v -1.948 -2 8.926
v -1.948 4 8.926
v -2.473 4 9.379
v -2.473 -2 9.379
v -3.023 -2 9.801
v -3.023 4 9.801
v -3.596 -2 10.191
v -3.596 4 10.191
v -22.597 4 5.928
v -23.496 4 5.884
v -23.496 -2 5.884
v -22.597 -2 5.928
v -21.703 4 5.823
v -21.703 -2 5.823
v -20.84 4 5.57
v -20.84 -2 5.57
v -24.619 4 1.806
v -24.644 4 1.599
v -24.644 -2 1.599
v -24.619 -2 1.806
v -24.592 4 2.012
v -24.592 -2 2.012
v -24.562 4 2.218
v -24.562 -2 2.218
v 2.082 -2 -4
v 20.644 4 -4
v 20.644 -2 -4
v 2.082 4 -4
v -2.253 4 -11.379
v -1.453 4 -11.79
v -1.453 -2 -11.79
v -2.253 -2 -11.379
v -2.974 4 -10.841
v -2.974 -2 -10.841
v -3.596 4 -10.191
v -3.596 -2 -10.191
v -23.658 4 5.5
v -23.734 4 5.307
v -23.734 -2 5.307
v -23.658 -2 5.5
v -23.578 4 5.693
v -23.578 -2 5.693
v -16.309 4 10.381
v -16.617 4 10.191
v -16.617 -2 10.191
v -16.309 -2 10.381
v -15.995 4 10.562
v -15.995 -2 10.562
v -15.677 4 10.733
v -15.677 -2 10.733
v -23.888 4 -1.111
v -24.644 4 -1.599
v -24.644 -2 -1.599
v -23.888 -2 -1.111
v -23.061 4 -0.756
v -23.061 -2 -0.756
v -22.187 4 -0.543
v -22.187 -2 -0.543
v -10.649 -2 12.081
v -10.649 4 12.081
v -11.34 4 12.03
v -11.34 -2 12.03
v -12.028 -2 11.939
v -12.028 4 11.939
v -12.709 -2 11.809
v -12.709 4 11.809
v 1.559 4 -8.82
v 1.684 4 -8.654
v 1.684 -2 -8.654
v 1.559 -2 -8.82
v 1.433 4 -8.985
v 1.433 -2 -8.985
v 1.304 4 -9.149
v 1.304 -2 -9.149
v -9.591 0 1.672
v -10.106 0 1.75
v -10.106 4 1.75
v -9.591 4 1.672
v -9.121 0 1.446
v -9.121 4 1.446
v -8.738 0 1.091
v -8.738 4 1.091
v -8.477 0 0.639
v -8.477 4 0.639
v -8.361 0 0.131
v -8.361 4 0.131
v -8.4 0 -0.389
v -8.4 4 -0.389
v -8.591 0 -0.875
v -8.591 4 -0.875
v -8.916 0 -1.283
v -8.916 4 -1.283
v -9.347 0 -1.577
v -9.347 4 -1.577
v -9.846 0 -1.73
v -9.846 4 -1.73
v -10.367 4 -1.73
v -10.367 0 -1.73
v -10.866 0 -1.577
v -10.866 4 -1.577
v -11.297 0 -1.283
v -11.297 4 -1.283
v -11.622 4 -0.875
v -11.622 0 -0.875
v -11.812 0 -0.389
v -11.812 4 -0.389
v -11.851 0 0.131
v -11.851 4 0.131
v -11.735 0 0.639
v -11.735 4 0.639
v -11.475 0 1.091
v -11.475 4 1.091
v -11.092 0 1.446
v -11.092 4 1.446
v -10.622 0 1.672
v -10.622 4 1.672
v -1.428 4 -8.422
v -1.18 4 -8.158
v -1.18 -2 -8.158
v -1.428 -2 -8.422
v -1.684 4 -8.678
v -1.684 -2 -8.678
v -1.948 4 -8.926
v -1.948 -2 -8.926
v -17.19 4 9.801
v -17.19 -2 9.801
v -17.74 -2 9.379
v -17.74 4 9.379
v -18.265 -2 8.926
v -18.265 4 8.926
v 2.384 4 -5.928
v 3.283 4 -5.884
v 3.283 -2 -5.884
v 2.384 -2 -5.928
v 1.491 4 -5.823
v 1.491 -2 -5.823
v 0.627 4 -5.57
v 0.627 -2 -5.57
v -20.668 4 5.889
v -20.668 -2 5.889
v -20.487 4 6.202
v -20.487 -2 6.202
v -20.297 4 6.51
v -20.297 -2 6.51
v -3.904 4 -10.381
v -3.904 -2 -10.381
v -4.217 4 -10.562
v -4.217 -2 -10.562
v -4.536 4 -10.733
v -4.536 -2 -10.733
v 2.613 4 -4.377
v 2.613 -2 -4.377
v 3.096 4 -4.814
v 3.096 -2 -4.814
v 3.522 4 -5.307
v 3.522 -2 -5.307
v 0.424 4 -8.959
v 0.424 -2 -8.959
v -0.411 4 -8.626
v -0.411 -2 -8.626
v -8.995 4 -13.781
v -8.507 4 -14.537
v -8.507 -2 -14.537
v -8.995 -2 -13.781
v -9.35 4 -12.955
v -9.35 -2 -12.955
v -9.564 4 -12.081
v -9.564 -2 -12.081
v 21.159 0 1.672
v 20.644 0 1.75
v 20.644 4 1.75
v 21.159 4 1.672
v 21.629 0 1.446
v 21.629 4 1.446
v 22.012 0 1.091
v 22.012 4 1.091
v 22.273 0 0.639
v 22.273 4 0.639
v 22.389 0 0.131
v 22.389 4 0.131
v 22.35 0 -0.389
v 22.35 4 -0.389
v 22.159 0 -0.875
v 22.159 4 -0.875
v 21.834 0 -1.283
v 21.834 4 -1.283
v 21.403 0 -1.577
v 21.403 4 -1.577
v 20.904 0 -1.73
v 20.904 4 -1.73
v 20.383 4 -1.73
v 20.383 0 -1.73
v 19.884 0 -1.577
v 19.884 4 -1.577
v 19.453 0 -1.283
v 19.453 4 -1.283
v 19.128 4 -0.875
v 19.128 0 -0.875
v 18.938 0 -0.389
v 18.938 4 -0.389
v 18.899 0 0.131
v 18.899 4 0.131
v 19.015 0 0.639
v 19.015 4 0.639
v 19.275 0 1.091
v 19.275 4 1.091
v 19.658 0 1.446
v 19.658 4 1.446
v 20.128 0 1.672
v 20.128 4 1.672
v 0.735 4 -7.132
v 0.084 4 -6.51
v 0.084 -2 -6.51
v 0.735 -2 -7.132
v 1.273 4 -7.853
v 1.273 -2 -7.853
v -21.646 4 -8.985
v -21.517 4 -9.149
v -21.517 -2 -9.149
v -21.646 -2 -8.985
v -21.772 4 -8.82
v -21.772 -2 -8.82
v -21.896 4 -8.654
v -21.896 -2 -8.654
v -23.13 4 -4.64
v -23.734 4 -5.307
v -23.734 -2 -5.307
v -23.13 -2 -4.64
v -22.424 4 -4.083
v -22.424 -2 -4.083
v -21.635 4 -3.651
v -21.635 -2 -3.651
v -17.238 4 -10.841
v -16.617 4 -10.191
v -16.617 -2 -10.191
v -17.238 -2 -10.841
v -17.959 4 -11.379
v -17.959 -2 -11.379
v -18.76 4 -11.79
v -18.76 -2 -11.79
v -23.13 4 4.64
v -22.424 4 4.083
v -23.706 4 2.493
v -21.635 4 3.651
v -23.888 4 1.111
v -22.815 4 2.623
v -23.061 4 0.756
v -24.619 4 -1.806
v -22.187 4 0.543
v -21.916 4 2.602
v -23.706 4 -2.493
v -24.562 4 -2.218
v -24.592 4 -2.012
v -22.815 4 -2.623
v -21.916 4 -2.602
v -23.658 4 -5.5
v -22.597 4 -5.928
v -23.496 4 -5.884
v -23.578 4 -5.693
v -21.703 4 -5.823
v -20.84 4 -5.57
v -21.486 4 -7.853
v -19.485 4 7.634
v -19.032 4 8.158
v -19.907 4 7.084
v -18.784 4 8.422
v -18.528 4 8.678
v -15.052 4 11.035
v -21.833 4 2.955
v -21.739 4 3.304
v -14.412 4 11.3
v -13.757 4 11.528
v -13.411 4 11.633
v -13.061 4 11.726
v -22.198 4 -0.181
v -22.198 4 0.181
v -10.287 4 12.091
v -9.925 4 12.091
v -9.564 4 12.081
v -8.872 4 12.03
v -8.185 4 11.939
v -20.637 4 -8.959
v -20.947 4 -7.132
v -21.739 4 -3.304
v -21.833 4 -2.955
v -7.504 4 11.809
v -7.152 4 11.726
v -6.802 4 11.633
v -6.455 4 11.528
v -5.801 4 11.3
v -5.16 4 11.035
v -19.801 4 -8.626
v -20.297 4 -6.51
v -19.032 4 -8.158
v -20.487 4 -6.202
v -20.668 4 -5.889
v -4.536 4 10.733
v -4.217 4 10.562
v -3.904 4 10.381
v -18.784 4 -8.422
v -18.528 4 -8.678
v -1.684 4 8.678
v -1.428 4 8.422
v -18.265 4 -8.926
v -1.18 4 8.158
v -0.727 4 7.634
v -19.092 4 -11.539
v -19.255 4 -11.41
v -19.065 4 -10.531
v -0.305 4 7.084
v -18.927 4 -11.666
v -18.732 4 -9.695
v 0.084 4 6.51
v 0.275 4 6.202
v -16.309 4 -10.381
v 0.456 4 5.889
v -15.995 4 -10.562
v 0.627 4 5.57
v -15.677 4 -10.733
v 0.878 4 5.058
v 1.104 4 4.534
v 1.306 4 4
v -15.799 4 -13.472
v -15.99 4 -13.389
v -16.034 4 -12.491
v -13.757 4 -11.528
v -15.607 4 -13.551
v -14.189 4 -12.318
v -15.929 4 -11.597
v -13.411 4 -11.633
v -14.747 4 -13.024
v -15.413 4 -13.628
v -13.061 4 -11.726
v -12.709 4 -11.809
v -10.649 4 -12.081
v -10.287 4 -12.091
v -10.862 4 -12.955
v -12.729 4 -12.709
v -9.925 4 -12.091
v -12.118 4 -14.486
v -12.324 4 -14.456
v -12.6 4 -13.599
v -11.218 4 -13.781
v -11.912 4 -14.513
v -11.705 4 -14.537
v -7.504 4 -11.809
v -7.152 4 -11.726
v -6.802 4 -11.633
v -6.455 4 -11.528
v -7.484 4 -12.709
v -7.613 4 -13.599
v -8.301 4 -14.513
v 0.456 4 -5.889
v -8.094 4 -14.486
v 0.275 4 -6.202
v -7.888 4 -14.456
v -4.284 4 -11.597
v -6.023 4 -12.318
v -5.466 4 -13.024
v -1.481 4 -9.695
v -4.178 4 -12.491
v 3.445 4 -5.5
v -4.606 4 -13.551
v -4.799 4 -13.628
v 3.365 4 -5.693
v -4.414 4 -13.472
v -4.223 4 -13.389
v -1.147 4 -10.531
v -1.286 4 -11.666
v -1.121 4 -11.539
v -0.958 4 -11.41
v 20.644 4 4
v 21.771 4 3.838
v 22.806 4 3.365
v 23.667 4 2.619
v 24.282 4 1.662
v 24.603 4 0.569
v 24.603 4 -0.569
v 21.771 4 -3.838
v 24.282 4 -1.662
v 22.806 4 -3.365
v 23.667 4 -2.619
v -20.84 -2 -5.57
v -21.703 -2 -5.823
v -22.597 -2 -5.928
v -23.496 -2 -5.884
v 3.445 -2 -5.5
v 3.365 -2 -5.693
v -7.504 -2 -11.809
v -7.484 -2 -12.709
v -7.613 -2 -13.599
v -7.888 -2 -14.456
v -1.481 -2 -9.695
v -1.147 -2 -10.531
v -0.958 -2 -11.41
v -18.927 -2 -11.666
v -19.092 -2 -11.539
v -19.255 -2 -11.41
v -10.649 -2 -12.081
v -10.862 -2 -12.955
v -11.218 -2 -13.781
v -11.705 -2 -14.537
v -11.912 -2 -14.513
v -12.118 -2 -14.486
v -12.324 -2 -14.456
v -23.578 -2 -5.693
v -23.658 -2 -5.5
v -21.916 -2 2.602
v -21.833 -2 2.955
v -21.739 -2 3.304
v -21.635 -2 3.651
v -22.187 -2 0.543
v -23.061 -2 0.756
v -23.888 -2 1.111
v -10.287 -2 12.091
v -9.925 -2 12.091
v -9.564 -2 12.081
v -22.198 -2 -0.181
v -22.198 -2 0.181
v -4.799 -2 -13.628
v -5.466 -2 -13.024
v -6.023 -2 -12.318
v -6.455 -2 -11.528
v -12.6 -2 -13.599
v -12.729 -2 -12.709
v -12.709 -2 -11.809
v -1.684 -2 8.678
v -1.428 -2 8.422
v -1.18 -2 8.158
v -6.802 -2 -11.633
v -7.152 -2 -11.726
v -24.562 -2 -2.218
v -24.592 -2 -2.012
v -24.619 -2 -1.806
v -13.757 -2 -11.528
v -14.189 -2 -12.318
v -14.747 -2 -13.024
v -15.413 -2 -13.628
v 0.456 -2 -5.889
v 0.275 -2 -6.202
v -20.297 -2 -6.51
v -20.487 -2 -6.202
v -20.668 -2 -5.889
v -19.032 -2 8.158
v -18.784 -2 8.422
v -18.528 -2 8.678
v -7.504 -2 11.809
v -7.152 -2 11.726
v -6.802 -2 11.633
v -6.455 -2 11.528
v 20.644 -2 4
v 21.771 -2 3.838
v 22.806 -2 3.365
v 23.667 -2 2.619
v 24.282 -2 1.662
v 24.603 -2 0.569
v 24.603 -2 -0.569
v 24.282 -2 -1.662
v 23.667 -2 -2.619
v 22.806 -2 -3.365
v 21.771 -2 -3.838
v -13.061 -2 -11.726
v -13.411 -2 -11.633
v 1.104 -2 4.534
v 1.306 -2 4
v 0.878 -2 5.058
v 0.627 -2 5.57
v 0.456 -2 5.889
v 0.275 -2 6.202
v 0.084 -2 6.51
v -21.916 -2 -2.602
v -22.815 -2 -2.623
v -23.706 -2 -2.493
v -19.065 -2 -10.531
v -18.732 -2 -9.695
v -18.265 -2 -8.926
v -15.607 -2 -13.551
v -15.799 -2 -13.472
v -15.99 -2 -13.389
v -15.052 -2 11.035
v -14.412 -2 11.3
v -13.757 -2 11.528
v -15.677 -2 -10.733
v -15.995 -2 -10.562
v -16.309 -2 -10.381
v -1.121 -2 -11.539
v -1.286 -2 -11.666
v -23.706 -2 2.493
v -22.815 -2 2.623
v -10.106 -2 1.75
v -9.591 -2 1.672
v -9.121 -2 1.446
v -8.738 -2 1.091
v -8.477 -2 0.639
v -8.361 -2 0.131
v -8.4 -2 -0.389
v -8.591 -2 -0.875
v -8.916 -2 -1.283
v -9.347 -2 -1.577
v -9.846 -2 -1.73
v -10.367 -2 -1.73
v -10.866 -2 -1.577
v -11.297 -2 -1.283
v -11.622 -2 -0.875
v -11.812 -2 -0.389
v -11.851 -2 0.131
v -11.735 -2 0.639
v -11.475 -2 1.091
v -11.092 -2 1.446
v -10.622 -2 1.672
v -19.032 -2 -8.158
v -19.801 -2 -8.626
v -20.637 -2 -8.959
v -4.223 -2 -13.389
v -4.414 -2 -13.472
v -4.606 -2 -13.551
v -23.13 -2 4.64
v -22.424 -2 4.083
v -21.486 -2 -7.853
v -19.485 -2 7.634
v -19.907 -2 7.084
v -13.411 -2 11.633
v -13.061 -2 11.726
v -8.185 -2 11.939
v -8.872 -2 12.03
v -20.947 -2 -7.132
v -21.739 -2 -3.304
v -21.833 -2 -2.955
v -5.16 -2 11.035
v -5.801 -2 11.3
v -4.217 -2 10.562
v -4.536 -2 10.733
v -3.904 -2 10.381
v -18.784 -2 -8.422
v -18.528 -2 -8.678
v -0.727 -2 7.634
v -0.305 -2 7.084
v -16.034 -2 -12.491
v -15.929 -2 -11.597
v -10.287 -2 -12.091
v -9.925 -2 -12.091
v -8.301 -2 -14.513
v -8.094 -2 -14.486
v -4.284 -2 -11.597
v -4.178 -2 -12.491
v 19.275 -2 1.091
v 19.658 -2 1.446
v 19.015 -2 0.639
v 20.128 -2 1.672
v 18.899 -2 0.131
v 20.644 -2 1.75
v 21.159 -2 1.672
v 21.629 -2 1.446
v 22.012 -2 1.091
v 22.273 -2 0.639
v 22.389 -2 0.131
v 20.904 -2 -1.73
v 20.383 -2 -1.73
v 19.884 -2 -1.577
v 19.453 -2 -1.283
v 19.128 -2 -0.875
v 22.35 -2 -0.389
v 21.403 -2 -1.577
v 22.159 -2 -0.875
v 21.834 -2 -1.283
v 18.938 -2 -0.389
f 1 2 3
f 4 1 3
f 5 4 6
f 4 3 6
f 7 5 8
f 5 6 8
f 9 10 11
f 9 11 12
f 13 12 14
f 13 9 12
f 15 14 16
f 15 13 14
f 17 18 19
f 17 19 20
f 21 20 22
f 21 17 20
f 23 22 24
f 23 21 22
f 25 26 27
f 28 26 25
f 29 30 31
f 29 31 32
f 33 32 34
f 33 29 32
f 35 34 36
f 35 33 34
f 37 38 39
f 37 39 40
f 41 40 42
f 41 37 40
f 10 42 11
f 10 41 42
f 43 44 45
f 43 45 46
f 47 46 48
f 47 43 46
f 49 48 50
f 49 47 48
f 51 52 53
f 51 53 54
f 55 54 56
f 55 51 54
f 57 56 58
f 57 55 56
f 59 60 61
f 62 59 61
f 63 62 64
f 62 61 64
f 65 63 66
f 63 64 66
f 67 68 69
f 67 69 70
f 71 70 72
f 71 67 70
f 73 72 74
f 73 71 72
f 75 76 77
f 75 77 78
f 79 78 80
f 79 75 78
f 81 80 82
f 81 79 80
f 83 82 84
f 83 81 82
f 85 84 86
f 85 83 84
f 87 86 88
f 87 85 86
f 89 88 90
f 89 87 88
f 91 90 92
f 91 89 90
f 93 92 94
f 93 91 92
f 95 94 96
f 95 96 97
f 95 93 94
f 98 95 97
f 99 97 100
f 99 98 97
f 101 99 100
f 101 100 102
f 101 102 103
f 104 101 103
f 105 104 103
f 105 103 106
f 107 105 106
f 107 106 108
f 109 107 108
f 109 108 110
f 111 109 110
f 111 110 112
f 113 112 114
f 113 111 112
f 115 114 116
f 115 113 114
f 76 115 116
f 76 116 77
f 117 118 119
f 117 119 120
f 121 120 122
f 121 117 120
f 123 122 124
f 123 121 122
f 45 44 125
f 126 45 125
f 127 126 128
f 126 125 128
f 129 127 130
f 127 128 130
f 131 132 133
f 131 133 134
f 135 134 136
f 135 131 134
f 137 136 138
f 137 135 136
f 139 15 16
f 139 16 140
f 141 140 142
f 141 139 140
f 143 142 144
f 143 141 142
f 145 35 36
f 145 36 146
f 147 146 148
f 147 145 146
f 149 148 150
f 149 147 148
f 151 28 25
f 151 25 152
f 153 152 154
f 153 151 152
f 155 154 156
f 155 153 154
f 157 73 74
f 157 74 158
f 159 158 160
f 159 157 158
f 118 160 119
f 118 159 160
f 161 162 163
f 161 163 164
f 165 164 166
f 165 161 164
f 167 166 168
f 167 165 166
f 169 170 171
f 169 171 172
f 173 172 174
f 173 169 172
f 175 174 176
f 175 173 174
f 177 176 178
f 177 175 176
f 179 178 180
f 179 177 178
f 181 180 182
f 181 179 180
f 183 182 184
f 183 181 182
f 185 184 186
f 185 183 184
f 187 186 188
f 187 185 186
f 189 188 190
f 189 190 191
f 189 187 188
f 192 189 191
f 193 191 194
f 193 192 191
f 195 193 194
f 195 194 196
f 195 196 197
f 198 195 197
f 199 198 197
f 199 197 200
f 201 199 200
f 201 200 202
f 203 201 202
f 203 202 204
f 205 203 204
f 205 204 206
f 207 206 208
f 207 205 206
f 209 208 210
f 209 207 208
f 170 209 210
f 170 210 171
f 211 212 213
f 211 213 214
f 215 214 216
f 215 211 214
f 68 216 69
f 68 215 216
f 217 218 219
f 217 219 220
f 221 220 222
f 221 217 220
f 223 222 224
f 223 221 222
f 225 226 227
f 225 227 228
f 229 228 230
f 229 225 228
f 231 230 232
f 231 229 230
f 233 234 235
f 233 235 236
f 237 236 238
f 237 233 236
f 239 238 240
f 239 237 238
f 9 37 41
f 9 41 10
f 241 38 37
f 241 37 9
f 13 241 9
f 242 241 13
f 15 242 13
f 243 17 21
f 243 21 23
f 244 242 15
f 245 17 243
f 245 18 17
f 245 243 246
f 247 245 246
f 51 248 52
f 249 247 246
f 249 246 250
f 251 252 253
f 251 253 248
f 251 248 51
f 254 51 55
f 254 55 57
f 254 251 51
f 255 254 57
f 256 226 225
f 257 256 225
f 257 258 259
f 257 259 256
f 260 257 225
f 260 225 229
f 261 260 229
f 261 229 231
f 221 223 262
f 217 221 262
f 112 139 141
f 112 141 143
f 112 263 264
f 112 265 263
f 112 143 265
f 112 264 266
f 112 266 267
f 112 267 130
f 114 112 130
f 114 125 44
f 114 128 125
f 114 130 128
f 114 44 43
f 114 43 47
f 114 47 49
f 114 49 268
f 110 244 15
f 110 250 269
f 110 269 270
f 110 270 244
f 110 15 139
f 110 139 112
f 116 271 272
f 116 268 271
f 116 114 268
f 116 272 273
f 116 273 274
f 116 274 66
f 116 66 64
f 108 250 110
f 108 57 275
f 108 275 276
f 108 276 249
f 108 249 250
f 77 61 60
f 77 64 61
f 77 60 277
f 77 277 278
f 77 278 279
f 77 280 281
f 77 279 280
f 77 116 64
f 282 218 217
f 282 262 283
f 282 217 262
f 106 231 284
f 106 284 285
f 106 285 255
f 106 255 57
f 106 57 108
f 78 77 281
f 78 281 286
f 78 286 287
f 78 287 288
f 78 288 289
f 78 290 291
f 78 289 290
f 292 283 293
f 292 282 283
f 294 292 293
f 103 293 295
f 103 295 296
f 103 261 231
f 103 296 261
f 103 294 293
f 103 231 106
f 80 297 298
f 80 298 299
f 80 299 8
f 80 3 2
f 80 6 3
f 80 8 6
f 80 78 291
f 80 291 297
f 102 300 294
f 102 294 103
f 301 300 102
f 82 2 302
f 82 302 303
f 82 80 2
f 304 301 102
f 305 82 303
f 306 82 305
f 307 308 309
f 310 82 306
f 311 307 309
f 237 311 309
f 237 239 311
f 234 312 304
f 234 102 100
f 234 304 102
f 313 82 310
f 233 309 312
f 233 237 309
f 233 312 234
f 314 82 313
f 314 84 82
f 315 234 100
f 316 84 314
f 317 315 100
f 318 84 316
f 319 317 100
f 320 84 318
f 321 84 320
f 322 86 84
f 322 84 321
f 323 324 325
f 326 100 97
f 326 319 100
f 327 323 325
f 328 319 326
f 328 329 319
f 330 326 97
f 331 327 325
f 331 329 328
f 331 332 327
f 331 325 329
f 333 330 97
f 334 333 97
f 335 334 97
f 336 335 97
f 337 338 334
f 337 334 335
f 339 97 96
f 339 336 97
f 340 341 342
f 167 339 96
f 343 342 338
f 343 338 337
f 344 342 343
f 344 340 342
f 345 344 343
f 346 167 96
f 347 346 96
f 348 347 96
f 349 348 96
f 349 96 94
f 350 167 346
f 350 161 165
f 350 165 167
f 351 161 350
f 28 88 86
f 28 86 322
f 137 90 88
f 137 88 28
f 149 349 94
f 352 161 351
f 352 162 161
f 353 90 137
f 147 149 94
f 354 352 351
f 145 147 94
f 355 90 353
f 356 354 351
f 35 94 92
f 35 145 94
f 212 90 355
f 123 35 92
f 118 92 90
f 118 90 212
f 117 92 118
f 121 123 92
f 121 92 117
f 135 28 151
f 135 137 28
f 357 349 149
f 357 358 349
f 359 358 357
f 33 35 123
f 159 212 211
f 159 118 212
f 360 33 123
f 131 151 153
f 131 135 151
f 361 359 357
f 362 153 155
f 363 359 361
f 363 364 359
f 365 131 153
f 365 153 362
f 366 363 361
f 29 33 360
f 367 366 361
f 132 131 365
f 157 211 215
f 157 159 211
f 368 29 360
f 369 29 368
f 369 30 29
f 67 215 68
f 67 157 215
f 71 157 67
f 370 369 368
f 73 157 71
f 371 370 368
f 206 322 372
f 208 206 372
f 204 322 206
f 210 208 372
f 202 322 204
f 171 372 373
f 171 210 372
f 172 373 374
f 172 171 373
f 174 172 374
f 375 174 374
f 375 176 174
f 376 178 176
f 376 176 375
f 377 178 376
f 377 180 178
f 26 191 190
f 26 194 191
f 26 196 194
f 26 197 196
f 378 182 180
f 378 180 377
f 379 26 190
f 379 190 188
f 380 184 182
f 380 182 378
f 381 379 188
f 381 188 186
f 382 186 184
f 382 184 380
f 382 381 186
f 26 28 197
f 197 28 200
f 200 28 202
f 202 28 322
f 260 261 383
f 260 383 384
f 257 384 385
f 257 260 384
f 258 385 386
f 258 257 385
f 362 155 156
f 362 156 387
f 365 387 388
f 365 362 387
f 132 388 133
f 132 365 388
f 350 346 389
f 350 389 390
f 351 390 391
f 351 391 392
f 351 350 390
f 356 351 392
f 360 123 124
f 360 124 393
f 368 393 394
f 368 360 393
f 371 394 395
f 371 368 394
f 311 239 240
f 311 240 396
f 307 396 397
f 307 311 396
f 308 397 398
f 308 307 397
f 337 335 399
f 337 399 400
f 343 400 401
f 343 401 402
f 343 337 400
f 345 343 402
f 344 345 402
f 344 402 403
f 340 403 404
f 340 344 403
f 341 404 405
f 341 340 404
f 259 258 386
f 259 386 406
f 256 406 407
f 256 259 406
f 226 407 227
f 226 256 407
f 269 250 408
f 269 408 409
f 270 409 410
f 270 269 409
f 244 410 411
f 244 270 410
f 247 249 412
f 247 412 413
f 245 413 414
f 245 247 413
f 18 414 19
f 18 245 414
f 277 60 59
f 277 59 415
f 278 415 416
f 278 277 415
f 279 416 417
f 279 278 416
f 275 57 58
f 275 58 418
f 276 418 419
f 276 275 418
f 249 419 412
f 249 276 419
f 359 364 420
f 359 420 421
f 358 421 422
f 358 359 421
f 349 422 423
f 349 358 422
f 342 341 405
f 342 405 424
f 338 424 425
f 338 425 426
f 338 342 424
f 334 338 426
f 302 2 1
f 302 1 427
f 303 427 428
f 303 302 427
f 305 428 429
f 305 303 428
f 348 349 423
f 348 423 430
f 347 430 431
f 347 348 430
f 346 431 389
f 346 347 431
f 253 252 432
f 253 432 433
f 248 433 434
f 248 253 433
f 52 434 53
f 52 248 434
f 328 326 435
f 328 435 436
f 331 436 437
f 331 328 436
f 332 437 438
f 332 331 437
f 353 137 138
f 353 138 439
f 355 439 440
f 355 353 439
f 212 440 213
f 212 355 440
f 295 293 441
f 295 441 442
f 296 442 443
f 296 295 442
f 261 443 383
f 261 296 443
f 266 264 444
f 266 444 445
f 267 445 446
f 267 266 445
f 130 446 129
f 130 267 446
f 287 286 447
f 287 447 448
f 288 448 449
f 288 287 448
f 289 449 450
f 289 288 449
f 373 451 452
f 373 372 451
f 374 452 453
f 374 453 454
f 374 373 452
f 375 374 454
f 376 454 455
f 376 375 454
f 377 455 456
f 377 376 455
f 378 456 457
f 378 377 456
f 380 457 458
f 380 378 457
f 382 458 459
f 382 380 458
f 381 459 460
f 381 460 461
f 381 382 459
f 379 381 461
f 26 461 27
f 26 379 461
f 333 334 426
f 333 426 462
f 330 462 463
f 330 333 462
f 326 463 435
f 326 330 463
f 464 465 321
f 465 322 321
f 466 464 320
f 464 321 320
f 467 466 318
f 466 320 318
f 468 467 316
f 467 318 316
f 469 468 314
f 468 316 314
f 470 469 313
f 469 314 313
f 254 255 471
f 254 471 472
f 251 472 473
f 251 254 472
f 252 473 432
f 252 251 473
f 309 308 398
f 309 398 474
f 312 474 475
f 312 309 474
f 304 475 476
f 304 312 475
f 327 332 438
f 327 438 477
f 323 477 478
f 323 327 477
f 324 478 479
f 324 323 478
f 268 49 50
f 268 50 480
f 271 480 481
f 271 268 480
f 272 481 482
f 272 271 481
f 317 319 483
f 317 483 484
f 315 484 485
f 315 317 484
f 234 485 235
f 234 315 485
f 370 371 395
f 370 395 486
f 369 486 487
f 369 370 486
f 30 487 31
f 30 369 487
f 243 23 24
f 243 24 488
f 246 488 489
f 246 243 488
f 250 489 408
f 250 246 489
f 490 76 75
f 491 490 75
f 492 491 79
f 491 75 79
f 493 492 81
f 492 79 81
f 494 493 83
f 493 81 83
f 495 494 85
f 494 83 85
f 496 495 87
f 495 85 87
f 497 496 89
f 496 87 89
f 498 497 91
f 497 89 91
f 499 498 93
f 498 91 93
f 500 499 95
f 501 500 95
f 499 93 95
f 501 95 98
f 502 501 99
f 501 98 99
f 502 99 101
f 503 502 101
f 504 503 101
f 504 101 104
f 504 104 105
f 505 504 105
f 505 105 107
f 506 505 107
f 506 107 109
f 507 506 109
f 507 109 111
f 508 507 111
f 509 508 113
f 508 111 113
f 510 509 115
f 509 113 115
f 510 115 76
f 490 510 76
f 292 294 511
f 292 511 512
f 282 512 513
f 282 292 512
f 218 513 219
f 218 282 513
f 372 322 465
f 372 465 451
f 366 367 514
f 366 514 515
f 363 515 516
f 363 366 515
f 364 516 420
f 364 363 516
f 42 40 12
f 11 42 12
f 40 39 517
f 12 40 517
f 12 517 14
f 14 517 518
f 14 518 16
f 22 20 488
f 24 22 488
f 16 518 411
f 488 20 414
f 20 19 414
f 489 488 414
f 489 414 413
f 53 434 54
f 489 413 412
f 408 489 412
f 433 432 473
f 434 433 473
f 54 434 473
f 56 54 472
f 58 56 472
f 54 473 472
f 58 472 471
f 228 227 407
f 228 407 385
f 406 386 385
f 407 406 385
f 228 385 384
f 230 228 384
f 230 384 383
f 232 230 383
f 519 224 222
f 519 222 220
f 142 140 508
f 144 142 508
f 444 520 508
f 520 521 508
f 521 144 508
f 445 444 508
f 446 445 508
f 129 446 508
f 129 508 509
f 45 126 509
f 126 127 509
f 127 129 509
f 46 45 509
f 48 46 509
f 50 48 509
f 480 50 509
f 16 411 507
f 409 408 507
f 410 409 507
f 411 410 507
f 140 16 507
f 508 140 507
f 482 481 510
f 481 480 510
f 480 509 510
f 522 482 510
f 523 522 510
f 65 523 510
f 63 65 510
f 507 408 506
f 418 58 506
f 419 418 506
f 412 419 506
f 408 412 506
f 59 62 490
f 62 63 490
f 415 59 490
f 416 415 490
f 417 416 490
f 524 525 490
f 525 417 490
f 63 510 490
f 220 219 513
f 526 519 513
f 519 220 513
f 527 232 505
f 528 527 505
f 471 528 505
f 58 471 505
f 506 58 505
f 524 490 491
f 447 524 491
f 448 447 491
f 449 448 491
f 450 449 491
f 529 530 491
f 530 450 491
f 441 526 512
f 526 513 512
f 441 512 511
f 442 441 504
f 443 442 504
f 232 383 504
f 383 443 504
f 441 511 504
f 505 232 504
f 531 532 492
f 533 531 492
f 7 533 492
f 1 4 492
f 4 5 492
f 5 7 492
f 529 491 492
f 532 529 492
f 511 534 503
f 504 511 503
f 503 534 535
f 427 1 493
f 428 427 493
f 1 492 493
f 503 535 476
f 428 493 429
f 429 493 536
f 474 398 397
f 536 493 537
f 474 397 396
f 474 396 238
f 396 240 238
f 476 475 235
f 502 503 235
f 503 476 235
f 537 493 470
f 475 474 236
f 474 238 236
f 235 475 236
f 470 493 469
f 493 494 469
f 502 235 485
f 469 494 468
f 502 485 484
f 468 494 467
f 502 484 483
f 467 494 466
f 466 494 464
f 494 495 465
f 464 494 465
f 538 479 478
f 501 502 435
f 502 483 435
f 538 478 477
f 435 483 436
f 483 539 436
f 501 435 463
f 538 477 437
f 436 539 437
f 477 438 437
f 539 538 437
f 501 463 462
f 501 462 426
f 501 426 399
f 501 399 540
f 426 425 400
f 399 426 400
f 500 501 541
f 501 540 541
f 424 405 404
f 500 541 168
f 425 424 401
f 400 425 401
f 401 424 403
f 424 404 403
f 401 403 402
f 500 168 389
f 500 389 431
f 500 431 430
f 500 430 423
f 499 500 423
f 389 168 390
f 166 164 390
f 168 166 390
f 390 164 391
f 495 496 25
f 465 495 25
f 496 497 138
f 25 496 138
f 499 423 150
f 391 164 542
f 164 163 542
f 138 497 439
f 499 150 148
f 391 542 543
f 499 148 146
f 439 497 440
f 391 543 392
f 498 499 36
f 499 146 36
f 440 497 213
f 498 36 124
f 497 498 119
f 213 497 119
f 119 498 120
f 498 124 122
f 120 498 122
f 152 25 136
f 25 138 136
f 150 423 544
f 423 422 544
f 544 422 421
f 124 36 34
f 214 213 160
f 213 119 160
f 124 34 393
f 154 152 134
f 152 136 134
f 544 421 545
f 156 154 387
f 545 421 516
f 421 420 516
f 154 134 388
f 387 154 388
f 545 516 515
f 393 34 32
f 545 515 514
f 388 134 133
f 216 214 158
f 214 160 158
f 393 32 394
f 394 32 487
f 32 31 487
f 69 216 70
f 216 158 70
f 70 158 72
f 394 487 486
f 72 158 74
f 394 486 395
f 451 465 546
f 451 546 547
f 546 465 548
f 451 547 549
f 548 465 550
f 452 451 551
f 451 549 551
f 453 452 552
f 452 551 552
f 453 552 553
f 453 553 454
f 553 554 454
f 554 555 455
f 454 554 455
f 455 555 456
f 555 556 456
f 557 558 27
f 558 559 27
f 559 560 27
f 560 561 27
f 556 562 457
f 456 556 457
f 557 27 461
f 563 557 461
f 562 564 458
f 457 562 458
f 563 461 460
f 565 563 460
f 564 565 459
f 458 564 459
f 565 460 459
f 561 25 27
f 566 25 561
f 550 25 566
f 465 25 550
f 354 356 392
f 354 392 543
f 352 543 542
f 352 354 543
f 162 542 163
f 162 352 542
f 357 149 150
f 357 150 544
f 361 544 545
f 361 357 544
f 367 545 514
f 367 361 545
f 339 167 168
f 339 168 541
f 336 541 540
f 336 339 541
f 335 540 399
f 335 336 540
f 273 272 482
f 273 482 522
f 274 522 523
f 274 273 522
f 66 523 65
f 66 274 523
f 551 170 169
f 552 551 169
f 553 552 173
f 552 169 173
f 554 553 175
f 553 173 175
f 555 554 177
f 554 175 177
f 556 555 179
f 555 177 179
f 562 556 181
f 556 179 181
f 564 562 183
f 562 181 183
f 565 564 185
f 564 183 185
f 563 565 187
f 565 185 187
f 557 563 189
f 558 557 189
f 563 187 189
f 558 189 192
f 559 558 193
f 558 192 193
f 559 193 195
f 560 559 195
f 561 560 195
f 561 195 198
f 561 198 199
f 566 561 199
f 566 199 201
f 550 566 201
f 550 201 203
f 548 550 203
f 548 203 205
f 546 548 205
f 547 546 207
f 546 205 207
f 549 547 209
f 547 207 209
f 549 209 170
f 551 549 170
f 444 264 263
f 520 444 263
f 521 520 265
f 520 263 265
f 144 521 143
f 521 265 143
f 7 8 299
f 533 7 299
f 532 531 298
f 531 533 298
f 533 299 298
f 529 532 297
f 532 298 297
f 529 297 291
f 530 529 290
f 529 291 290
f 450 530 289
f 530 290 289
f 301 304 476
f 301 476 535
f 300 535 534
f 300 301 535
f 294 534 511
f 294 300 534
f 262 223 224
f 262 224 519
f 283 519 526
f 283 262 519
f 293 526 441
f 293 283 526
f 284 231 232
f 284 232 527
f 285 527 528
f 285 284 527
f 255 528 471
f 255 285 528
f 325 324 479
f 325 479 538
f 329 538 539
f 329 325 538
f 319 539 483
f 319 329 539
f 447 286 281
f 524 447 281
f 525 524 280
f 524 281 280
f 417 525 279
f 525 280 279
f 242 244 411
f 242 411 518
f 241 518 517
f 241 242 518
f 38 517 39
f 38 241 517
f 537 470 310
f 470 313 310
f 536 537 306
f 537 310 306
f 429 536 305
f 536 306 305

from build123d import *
from build123d.topology import SkipClean

# Parameters (mm, degrees)
SKETCH1_R           = 1.75
BOSS_EXTRUDE1_DEPTH = 4
CUT_EXTRUDE1_START  = -10
CUT_EXTRUDE1_DEPTH  = 10
MOVE_FACE1_BY       = 2


with BuildPart() as part:
    # Sketch1 → Boss-Extrude1 (new body)
    with BuildSketch(Plane(origin=(0, 0, 0), x_dir=(1, 0, 0), z_dir=(0, 1, 0))):
        with BuildLine():
            Line((20.643657446, 4), (2.081641936, 4))
            ThreePointArc((2.081641936, 4), (2.861028333, 4.588201733), (3.521749436, 5.30713988))
            ThreePointArc((3.521749436, 5.30713988), (3.405395609, 5.596745198), (3.282888305, 5.883801663))
            ThreePointArc((3.282888305, 5.883801663), (1.93527598, 5.894040025), (0.627094961, 5.57027124))
            ThreePointArc((0.627094961, 5.57027124), (0.366286148, 6.046375), (0.084372603, 6.510293938))
            ThreePointArc((0.084372603, 6.510293938), (1.018855105, 7.48132754), (1.683794586, 8.65351323))
            ThreePointArc((1.683794586, 8.65351323), (1.496450048, 8.903135899), (1.303821399, 9.148703928))
            ThreePointArc((1.303821399, 9.148703928), (-0.000522033, 8.809805691), (-1.180330337, 8.158486898))
            ThreePointArc((-1.180330337, 8.158486898), (-1.555477026, 8.550865528), (-1.947855656, 8.926012217))
            ThreePointArc((-1.947855656, 8.926012217), (-1.296536862, 10.105820521), (-0.957638625, 11.410163953))
            ThreePointArc((-0.957638625, 11.410163953), (-1.203206655, 11.602792602), (-1.452829324, 11.79013714))
            ThreePointArc((-1.452829324, 11.79013714), (-2.625015014, 11.125197659), (-3.596048616, 10.190715157))
            ThreePointArc((-3.596048616, 10.190715157), (-4.059967554, 10.472628702), (-4.536071314, 10.733437515))
            ThreePointArc((-4.536071314, 10.733437515), (-4.212302529, 12.041618533), (-4.222540891, 13.389230859))
            ThreePointArc((-4.222540891, 13.389230859), (-4.509597355, 13.511738163), (-4.799202674, 13.62809199))
            ThreePointArc((-4.799202674, 13.62809199), (-5.759348103, 12.682425791), (-6.455432668, 11.528463019))
            ThreePointArc((-6.455432668, 11.528463019), (-6.976508546, 11.680699536), (-7.503891752, 11.809396783))
            ThreePointArc((-7.503891752, 11.809396783), (-7.529737283, 13.156800143), (-7.888414517, 14.455843809))
            ThreePointArc((-7.888414517, 14.455843809), (-8.197396993, 14.499881098), (-8.507248835, 14.537314892))
            ThreePointArc((-8.507248835, 14.537314892), (-9.18992168, 13.375367565), (-9.563620196, 12.080565177))
            ThreePointArc((-9.563620196, 12.080565177), (-10.106342554, 12.09275), (-10.649064912, 12.080565177))
            ThreePointArc((-10.649064912, 12.080565177), (-11.022763428, 13.375367565), (-11.705436272, 14.537314892))
            ThreePointArc((-11.705436272, 14.537314892), (-12.015288115, 14.499881098), (-12.324270591, 14.455843809))
            ThreePointArc((-12.324270591, 14.455843809), (-12.682947825, 13.156800143), (-12.708793355, 11.809396783))
            ThreePointArc((-12.708793355, 11.809396783), (-13.236176561, 11.680699536), (-13.757252439, 11.528463019))
            ThreePointArc((-13.757252439, 11.528463019), (-14.453337005, 12.682425791), (-15.413482434, 13.62809199))
            ThreePointArc((-15.413482434, 13.62809199), (-15.703087752, 13.511738163), (-15.990144217, 13.389230859))
            ThreePointArc((-15.990144217, 13.389230859), (-16.000382579, 12.041618533), (-15.676613793, 10.733437515))
            ThreePointArc((-15.676613793, 10.733437515), (-16.152717554, 10.472628702), (-16.616636492, 10.190715157))
            ThreePointArc((-16.616636492, 10.190715157), (-17.587670094, 11.125197659), (-18.759855783, 11.79013714))
            ThreePointArc((-18.759855783, 11.79013714), (-19.009478453, 11.602792602), (-19.255046482, 11.410163953))
            ThreePointArc((-19.255046482, 11.410163953), (-18.916148245, 10.105820521), (-18.264829452, 8.926012217))
            ThreePointArc((-18.264829452, 8.926012217), (-18.657208082, 8.550865528), (-19.032354771, 8.158486898))
            ThreePointArc((-19.032354771, 8.158486898), (-20.212163074, 8.809805691), (-21.516506507, 9.148703928))
            ThreePointArc((-21.516506507, 9.148703928), (-21.709135156, 8.903135899), (-21.896479694, 8.65351323))
            ThreePointArc((-21.896479694, 8.65351323), (-21.231540213, 7.48132754), (-20.297057711, 6.510293938))
            ThreePointArc((-20.297057711, 6.510293938), (-20.578971255, 6.046375), (-20.839780068, 5.57027124))
            ThreePointArc((-20.839780068, 5.57027124), (-22.147961087, 5.894040025), (-23.495573413, 5.883801663))
            ThreePointArc((-23.495573413, 5.883801663), (-23.618080717, 5.596745198), (-23.734434544, 5.30713988))
            ThreePointArc((-23.734434544, 5.30713988), (-22.788768345, 4.346994451), (-21.634805572, 3.650909885))
            ThreePointArc((-21.634805572, 3.650909885), (-21.78704209, 3.129834008), (-21.915739337, 2.602450802))
            ThreePointArc((-21.915739337, 2.602450802), (-23.263142697, 2.576605271), (-24.562186363, 2.217928037))
            ThreePointArc((-24.562186363, 2.217928037), (-24.606223651, 1.908945561), (-24.643657446, 1.599093719))
            ThreePointArc((-24.643657446, 1.599093719), (-23.481710119, 0.916420874), (-22.186907731, 0.542722358))
            ThreePointArc((-22.186907731, 0.542722358), (-22.199092554, 0), (-22.186907731, -0.542722358))
            ThreePointArc((-22.186907731, -0.542722358), (-23.481710119, -0.916420874), (-24.643657446, -1.599093719))
            ThreePointArc((-24.643657446, -1.599093719), (-24.606223651, -1.908945561), (-24.562186363, -2.217928037))
            ThreePointArc((-24.562186363, -2.217928037), (-23.263142697, -2.576605271), (-21.915739337, -2.602450802))
            ThreePointArc((-21.915739337, -2.602450802), (-21.78704209, -3.129834008), (-21.634805572, -3.650909885))
            ThreePointArc((-21.634805572, -3.650909885), (-22.788768345, -4.346994451), (-23.734434544, -5.30713988))
            ThreePointArc((-23.734434544, -5.30713988), (-23.618080717, -5.596745198), (-23.495573413, -5.883801663))
            ThreePointArc((-23.495573413, -5.883801663), (-22.147961087, -5.894040025), (-20.839780068, -5.57027124))
            ThreePointArc((-20.839780068, -5.57027124), (-20.578971255, -6.046375), (-20.297057711, -6.510293938))
            ThreePointArc((-20.297057711, -6.510293938), (-21.231540213, -7.48132754), (-21.896479694, -8.65351323))
            ThreePointArc((-21.896479694, -8.65351323), (-21.709135156, -8.903135899), (-21.516506507, -9.148703928))
            ThreePointArc((-21.516506507, -9.148703928), (-20.212163074, -8.809805691), (-19.032354771, -8.158486898))
            ThreePointArc((-19.032354771, -8.158486898), (-18.657208082, -8.550865528), (-18.264829452, -8.926012217))
            ThreePointArc((-18.264829452, -8.926012217), (-18.916148245, -10.105820521), (-19.255046482, -11.410163953))
            ThreePointArc((-19.255046482, -11.410163953), (-19.009478453, -11.602792602), (-18.759855783, -11.79013714))
            ThreePointArc((-18.759855783, -11.79013714), (-17.587670094, -11.125197659), (-16.616636492, -10.190715157))
            ThreePointArc((-16.616636492, -10.190715157), (-16.152717554, -10.472628702), (-15.676613793, -10.733437515))
            ThreePointArc((-15.676613793, -10.733437515), (-16.000382579, -12.041618533), (-15.990144217, -13.389230859))
            ThreePointArc((-15.990144217, -13.389230859), (-15.703087752, -13.511738163), (-15.413482434, -13.62809199))
            ThreePointArc((-15.413482434, -13.62809199), (-14.453337005, -12.682425791), (-13.757252439, -11.528463019))
            ThreePointArc((-13.757252439, -11.528463019), (-13.236176561, -11.680699536), (-12.708793355, -11.809396783))
            ThreePointArc((-12.708793355, -11.809396783), (-12.682947825, -13.156800143), (-12.324270591, -14.455843809))
            ThreePointArc((-12.324270591, -14.455843809), (-12.015288115, -14.499881098), (-11.705436272, -14.537314892))
            ThreePointArc((-11.705436272, -14.537314892), (-11.022763428, -13.375367565), (-10.649064912, -12.080565177))
            ThreePointArc((-10.649064912, -12.080565177), (-10.106342554, -12.09275), (-9.563620196, -12.080565177))
            ThreePointArc((-9.563620196, -12.080565177), (-9.18992168, -13.375367565), (-8.507248835, -14.537314892))
            ThreePointArc((-8.507248835, -14.537314892), (-8.197396993, -14.499881098), (-7.888414517, -14.455843809))
            ThreePointArc((-7.888414517, -14.455843809), (-7.529737283, -13.156800143), (-7.503891752, -11.809396783))
            ThreePointArc((-7.503891752, -11.809396783), (-6.976508546, -11.680699536), (-6.455432668, -11.528463019))
            ThreePointArc((-6.455432668, -11.528463019), (-5.759348103, -12.682425791), (-4.799202674, -13.62809199))
            ThreePointArc((-4.799202674, -13.62809199), (-4.509597355, -13.511738163), (-4.222540891, -13.389230859))
            ThreePointArc((-4.222540891, -13.389230859), (-4.212302529, -12.041618533), (-4.536071314, -10.733437515))
            ThreePointArc((-4.536071314, -10.733437515), (-4.059967554, -10.472628702), (-3.596048616, -10.190715157))
            ThreePointArc((-3.596048616, -10.190715157), (-2.625015014, -11.125197659), (-1.452829324, -11.79013714))
            ThreePointArc((-1.452829324, -11.79013714), (-1.203206655, -11.602792602), (-0.957638625, -11.410163953))
            ThreePointArc((-0.957638625, -11.410163953), (-1.296536862, -10.105820521), (-1.947855656, -8.926012217))
            ThreePointArc((-1.947855656, -8.926012217), (-1.555477026, -8.550865528), (-1.180330337, -8.158486898))
            ThreePointArc((-1.180330337, -8.158486898), (-0.000522033, -8.809805691), (1.303821399, -9.148703928))
            ThreePointArc((1.303821399, -9.148703928), (1.496450048, -8.903135899), (1.683794586, -8.65351323))
            ThreePointArc((1.683794586, -8.65351323), (1.018855105, -7.48132754), (0.084372603, -6.510293938))
            ThreePointArc((0.084372603, -6.510293938), (0.366286148, -6.046375), (0.627094961, -5.57027124))
            ThreePointArc((0.627094961, -5.57027124), (1.93527598, -5.894040025), (3.282888305, -5.883801663))
            ThreePointArc((3.282888305, -5.883801663), (3.405395609, -5.596745198), (3.521749436, -5.30713988))
            ThreePointArc((3.521749436, -5.30713988), (2.861028333, -4.588201733), (2.081641936, -4))
            Line((2.081641936, -4), (20.643657446, -4))
            ThreePointArc((20.643657446, -4), (24.643657446, 0), (20.643657446, 4))
        make_face()
        with Locations(Location((-10.106342554, 0, 0), (0, 0, 270))):
            Circle(SKETCH1_R, mode=Mode.SUBTRACT)
        with Locations(Location((20.643657446, 0, 0), (0, 0, 270))):
            Circle(SKETCH1_R, mode=Mode.SUBTRACT)
    extrude(amount=BOSS_EXTRUDE1_DEPTH)

    # Sketch2 → Cut-Extrude1 (cut)
    with SkipClean():  # the faces are left unmerged after this step: merging them gives an invalid solid
        with BuildSketch(Plane(origin=(0, 4, 0), x_dir=(1, 0, 0), z_dir=(0, 1, 0)).offset(CUT_EXTRUDE1_START)):
            with BuildLine():
                ThreePointArc((-21.516506507, -9.148703928), (-20.212163074, -8.809805691), (-19.032354771, -8.158486898))
                ThreePointArc((-19.032354771, -8.158486898), (-19.70016616, -7.361599771), (-20.297057711, -6.510293938))
                ThreePointArc((-20.297057711, -6.510293938), (-21.231540213, -7.48132754), (-21.896479694, -8.65351323))
                ThreePointArc((-21.896479694, -8.65351323), (-21.709135156, -8.903135899), (-21.516506507, -9.148703928))
            make_face()
            with BuildLine():
                ThreePointArc((-18.759855783, -11.79013714), (-17.587670094, -11.125197659), (-16.616636492, -10.190715157))
                ThreePointArc((-16.616636492, -10.190715157), (-17.467942324, -9.593823606), (-18.264829452, -8.926012217))
                ThreePointArc((-18.264829452, -8.926012217), (-18.916148245, -10.105820521), (-19.255046482, -11.410163953))
                ThreePointArc((-19.255046482, -11.410163953), (-19.009478453, -11.602792602), (-18.759855783, -11.79013714))
            make_face()
            with BuildLine():
                ThreePointArc((-15.413482434, -13.62809199), (-14.453337005, -12.682425791), (-13.757252439, -11.528463019))
                ThreePointArc((-13.757252439, -11.528463019), (-14.734037631, -11.172244217), (-15.676613793, -10.733437515))
                ThreePointArc((-15.676613793, -10.733437515), (-16.000382579, -12.041618533), (-15.990144217, -13.389230859))
                ThreePointArc((-15.990144217, -13.389230859), (-15.703087752, -13.511738163), (-15.413482434, -13.62809199))
            make_face()
            with BuildLine():
                ThreePointArc((-11.705436272, -14.537314892), (-11.022763428, -13.375367565), (-10.649064912, -12.080565177))
                ThreePointArc((-10.649064912, -12.080565177), (-11.684763165, -11.989294847), (-12.708793355, -11.809396783))
                ThreePointArc((-12.708793355, -11.809396783), (-12.682947825, -13.156800143), (-12.324270591, -14.455843809))
                ThreePointArc((-12.324270591, -14.455843809), (-12.015288115, -14.499881098), (-11.705436272, -14.537314892))
            make_face()
            with BuildLine():
                ThreePointArc((-7.888414517, -14.455843809), (-7.529737283, -13.156800143), (-7.503891752, -11.809396783))
                ThreePointArc((-7.503891752, -11.809396783), (-8.527921943, -11.989294847), (-9.563620196, -12.080565177))
                ThreePointArc((-9.563620196, -12.080565177), (-9.18992168, -13.375367565), (-8.507248835, -14.537314892))
                ThreePointArc((-8.507248835, -14.537314892), (-8.197396993, -14.499881098), (-7.888414517, -14.455843809))
            make_face()
            with BuildLine():
                ThreePointArc((-4.222540891, -13.389230859), (-4.212302529, -12.041618533), (-4.536071314, -10.733437515))
                ThreePointArc((-4.536071314, -10.733437515), (-5.478647477, -11.172244217), (-6.455432668, -11.528463019))
                ThreePointArc((-6.455432668, -11.528463019), (-5.759348103, -12.682425791), (-4.799202674, -13.62809199))
                ThreePointArc((-4.799202674, -13.62809199), (-4.509597355, -13.511738163), (-4.222540891, -13.389230859))
            make_face()
            with BuildLine():
                ThreePointArc((-0.957638625, -11.410163953), (-1.296536862, -10.105820521), (-1.947855656, -8.926012217))
                ThreePointArc((-1.947855656, -8.926012217), (-2.744742783, -9.593823606), (-3.596048616, -10.190715157))
                ThreePointArc((-3.596048616, -10.190715157), (-2.625015014, -11.125197659), (-1.452829324, -11.79013714))
                ThreePointArc((-1.452829324, -11.79013714), (-1.203206655, -11.602792602), (-0.957638625, -11.410163953))
            make_face()
            with BuildLine():
                ThreePointArc((1.683794586, -8.65351323), (1.018855105, -7.48132754), (0.084372603, -6.510293938))
                ThreePointArc((0.084372603, -6.510293938), (-0.512518948, -7.361599771), (-1.180330337, -8.158486898))
                ThreePointArc((-1.180330337, -8.158486898), (-0.000522033, -8.809805691), (1.303821399, -9.148703928))
                ThreePointArc((1.303821399, -9.148703928), (1.496450048, -8.903135899), (1.683794586, -8.65351323))
            make_face()
            with BuildLine():
                ThreePointArc((3.521749436, -5.30713988), (2.861028333, -4.588201733), (2.081641936, -4))
                Line((2.081641936, -4), (1.305695063, -4))
                ThreePointArc((1.305695063, -4), (0.994195953, -4.797149927), (0.627094961, -5.57027124))
                ThreePointArc((0.627094961, -5.57027124), (1.93527598, -5.894040025), (3.282888305, -5.883801663))
                ThreePointArc((3.282888305, -5.883801663), (3.405395609, -5.596745198), (3.521749436, -5.30713988))
            make_face()
        extrude(amount=CUT_EXTRUDE1_DEPTH, mode=Mode.SUBTRACT)

    # Move Face1: a face moved outward by 2.0
    extrude(part.faces().sort_by_distance((-4.746120399, 0, -0.554147216))[0], amount=MOVE_FACE1_BY, dir=(0, -1, 0))


solid = part.part
